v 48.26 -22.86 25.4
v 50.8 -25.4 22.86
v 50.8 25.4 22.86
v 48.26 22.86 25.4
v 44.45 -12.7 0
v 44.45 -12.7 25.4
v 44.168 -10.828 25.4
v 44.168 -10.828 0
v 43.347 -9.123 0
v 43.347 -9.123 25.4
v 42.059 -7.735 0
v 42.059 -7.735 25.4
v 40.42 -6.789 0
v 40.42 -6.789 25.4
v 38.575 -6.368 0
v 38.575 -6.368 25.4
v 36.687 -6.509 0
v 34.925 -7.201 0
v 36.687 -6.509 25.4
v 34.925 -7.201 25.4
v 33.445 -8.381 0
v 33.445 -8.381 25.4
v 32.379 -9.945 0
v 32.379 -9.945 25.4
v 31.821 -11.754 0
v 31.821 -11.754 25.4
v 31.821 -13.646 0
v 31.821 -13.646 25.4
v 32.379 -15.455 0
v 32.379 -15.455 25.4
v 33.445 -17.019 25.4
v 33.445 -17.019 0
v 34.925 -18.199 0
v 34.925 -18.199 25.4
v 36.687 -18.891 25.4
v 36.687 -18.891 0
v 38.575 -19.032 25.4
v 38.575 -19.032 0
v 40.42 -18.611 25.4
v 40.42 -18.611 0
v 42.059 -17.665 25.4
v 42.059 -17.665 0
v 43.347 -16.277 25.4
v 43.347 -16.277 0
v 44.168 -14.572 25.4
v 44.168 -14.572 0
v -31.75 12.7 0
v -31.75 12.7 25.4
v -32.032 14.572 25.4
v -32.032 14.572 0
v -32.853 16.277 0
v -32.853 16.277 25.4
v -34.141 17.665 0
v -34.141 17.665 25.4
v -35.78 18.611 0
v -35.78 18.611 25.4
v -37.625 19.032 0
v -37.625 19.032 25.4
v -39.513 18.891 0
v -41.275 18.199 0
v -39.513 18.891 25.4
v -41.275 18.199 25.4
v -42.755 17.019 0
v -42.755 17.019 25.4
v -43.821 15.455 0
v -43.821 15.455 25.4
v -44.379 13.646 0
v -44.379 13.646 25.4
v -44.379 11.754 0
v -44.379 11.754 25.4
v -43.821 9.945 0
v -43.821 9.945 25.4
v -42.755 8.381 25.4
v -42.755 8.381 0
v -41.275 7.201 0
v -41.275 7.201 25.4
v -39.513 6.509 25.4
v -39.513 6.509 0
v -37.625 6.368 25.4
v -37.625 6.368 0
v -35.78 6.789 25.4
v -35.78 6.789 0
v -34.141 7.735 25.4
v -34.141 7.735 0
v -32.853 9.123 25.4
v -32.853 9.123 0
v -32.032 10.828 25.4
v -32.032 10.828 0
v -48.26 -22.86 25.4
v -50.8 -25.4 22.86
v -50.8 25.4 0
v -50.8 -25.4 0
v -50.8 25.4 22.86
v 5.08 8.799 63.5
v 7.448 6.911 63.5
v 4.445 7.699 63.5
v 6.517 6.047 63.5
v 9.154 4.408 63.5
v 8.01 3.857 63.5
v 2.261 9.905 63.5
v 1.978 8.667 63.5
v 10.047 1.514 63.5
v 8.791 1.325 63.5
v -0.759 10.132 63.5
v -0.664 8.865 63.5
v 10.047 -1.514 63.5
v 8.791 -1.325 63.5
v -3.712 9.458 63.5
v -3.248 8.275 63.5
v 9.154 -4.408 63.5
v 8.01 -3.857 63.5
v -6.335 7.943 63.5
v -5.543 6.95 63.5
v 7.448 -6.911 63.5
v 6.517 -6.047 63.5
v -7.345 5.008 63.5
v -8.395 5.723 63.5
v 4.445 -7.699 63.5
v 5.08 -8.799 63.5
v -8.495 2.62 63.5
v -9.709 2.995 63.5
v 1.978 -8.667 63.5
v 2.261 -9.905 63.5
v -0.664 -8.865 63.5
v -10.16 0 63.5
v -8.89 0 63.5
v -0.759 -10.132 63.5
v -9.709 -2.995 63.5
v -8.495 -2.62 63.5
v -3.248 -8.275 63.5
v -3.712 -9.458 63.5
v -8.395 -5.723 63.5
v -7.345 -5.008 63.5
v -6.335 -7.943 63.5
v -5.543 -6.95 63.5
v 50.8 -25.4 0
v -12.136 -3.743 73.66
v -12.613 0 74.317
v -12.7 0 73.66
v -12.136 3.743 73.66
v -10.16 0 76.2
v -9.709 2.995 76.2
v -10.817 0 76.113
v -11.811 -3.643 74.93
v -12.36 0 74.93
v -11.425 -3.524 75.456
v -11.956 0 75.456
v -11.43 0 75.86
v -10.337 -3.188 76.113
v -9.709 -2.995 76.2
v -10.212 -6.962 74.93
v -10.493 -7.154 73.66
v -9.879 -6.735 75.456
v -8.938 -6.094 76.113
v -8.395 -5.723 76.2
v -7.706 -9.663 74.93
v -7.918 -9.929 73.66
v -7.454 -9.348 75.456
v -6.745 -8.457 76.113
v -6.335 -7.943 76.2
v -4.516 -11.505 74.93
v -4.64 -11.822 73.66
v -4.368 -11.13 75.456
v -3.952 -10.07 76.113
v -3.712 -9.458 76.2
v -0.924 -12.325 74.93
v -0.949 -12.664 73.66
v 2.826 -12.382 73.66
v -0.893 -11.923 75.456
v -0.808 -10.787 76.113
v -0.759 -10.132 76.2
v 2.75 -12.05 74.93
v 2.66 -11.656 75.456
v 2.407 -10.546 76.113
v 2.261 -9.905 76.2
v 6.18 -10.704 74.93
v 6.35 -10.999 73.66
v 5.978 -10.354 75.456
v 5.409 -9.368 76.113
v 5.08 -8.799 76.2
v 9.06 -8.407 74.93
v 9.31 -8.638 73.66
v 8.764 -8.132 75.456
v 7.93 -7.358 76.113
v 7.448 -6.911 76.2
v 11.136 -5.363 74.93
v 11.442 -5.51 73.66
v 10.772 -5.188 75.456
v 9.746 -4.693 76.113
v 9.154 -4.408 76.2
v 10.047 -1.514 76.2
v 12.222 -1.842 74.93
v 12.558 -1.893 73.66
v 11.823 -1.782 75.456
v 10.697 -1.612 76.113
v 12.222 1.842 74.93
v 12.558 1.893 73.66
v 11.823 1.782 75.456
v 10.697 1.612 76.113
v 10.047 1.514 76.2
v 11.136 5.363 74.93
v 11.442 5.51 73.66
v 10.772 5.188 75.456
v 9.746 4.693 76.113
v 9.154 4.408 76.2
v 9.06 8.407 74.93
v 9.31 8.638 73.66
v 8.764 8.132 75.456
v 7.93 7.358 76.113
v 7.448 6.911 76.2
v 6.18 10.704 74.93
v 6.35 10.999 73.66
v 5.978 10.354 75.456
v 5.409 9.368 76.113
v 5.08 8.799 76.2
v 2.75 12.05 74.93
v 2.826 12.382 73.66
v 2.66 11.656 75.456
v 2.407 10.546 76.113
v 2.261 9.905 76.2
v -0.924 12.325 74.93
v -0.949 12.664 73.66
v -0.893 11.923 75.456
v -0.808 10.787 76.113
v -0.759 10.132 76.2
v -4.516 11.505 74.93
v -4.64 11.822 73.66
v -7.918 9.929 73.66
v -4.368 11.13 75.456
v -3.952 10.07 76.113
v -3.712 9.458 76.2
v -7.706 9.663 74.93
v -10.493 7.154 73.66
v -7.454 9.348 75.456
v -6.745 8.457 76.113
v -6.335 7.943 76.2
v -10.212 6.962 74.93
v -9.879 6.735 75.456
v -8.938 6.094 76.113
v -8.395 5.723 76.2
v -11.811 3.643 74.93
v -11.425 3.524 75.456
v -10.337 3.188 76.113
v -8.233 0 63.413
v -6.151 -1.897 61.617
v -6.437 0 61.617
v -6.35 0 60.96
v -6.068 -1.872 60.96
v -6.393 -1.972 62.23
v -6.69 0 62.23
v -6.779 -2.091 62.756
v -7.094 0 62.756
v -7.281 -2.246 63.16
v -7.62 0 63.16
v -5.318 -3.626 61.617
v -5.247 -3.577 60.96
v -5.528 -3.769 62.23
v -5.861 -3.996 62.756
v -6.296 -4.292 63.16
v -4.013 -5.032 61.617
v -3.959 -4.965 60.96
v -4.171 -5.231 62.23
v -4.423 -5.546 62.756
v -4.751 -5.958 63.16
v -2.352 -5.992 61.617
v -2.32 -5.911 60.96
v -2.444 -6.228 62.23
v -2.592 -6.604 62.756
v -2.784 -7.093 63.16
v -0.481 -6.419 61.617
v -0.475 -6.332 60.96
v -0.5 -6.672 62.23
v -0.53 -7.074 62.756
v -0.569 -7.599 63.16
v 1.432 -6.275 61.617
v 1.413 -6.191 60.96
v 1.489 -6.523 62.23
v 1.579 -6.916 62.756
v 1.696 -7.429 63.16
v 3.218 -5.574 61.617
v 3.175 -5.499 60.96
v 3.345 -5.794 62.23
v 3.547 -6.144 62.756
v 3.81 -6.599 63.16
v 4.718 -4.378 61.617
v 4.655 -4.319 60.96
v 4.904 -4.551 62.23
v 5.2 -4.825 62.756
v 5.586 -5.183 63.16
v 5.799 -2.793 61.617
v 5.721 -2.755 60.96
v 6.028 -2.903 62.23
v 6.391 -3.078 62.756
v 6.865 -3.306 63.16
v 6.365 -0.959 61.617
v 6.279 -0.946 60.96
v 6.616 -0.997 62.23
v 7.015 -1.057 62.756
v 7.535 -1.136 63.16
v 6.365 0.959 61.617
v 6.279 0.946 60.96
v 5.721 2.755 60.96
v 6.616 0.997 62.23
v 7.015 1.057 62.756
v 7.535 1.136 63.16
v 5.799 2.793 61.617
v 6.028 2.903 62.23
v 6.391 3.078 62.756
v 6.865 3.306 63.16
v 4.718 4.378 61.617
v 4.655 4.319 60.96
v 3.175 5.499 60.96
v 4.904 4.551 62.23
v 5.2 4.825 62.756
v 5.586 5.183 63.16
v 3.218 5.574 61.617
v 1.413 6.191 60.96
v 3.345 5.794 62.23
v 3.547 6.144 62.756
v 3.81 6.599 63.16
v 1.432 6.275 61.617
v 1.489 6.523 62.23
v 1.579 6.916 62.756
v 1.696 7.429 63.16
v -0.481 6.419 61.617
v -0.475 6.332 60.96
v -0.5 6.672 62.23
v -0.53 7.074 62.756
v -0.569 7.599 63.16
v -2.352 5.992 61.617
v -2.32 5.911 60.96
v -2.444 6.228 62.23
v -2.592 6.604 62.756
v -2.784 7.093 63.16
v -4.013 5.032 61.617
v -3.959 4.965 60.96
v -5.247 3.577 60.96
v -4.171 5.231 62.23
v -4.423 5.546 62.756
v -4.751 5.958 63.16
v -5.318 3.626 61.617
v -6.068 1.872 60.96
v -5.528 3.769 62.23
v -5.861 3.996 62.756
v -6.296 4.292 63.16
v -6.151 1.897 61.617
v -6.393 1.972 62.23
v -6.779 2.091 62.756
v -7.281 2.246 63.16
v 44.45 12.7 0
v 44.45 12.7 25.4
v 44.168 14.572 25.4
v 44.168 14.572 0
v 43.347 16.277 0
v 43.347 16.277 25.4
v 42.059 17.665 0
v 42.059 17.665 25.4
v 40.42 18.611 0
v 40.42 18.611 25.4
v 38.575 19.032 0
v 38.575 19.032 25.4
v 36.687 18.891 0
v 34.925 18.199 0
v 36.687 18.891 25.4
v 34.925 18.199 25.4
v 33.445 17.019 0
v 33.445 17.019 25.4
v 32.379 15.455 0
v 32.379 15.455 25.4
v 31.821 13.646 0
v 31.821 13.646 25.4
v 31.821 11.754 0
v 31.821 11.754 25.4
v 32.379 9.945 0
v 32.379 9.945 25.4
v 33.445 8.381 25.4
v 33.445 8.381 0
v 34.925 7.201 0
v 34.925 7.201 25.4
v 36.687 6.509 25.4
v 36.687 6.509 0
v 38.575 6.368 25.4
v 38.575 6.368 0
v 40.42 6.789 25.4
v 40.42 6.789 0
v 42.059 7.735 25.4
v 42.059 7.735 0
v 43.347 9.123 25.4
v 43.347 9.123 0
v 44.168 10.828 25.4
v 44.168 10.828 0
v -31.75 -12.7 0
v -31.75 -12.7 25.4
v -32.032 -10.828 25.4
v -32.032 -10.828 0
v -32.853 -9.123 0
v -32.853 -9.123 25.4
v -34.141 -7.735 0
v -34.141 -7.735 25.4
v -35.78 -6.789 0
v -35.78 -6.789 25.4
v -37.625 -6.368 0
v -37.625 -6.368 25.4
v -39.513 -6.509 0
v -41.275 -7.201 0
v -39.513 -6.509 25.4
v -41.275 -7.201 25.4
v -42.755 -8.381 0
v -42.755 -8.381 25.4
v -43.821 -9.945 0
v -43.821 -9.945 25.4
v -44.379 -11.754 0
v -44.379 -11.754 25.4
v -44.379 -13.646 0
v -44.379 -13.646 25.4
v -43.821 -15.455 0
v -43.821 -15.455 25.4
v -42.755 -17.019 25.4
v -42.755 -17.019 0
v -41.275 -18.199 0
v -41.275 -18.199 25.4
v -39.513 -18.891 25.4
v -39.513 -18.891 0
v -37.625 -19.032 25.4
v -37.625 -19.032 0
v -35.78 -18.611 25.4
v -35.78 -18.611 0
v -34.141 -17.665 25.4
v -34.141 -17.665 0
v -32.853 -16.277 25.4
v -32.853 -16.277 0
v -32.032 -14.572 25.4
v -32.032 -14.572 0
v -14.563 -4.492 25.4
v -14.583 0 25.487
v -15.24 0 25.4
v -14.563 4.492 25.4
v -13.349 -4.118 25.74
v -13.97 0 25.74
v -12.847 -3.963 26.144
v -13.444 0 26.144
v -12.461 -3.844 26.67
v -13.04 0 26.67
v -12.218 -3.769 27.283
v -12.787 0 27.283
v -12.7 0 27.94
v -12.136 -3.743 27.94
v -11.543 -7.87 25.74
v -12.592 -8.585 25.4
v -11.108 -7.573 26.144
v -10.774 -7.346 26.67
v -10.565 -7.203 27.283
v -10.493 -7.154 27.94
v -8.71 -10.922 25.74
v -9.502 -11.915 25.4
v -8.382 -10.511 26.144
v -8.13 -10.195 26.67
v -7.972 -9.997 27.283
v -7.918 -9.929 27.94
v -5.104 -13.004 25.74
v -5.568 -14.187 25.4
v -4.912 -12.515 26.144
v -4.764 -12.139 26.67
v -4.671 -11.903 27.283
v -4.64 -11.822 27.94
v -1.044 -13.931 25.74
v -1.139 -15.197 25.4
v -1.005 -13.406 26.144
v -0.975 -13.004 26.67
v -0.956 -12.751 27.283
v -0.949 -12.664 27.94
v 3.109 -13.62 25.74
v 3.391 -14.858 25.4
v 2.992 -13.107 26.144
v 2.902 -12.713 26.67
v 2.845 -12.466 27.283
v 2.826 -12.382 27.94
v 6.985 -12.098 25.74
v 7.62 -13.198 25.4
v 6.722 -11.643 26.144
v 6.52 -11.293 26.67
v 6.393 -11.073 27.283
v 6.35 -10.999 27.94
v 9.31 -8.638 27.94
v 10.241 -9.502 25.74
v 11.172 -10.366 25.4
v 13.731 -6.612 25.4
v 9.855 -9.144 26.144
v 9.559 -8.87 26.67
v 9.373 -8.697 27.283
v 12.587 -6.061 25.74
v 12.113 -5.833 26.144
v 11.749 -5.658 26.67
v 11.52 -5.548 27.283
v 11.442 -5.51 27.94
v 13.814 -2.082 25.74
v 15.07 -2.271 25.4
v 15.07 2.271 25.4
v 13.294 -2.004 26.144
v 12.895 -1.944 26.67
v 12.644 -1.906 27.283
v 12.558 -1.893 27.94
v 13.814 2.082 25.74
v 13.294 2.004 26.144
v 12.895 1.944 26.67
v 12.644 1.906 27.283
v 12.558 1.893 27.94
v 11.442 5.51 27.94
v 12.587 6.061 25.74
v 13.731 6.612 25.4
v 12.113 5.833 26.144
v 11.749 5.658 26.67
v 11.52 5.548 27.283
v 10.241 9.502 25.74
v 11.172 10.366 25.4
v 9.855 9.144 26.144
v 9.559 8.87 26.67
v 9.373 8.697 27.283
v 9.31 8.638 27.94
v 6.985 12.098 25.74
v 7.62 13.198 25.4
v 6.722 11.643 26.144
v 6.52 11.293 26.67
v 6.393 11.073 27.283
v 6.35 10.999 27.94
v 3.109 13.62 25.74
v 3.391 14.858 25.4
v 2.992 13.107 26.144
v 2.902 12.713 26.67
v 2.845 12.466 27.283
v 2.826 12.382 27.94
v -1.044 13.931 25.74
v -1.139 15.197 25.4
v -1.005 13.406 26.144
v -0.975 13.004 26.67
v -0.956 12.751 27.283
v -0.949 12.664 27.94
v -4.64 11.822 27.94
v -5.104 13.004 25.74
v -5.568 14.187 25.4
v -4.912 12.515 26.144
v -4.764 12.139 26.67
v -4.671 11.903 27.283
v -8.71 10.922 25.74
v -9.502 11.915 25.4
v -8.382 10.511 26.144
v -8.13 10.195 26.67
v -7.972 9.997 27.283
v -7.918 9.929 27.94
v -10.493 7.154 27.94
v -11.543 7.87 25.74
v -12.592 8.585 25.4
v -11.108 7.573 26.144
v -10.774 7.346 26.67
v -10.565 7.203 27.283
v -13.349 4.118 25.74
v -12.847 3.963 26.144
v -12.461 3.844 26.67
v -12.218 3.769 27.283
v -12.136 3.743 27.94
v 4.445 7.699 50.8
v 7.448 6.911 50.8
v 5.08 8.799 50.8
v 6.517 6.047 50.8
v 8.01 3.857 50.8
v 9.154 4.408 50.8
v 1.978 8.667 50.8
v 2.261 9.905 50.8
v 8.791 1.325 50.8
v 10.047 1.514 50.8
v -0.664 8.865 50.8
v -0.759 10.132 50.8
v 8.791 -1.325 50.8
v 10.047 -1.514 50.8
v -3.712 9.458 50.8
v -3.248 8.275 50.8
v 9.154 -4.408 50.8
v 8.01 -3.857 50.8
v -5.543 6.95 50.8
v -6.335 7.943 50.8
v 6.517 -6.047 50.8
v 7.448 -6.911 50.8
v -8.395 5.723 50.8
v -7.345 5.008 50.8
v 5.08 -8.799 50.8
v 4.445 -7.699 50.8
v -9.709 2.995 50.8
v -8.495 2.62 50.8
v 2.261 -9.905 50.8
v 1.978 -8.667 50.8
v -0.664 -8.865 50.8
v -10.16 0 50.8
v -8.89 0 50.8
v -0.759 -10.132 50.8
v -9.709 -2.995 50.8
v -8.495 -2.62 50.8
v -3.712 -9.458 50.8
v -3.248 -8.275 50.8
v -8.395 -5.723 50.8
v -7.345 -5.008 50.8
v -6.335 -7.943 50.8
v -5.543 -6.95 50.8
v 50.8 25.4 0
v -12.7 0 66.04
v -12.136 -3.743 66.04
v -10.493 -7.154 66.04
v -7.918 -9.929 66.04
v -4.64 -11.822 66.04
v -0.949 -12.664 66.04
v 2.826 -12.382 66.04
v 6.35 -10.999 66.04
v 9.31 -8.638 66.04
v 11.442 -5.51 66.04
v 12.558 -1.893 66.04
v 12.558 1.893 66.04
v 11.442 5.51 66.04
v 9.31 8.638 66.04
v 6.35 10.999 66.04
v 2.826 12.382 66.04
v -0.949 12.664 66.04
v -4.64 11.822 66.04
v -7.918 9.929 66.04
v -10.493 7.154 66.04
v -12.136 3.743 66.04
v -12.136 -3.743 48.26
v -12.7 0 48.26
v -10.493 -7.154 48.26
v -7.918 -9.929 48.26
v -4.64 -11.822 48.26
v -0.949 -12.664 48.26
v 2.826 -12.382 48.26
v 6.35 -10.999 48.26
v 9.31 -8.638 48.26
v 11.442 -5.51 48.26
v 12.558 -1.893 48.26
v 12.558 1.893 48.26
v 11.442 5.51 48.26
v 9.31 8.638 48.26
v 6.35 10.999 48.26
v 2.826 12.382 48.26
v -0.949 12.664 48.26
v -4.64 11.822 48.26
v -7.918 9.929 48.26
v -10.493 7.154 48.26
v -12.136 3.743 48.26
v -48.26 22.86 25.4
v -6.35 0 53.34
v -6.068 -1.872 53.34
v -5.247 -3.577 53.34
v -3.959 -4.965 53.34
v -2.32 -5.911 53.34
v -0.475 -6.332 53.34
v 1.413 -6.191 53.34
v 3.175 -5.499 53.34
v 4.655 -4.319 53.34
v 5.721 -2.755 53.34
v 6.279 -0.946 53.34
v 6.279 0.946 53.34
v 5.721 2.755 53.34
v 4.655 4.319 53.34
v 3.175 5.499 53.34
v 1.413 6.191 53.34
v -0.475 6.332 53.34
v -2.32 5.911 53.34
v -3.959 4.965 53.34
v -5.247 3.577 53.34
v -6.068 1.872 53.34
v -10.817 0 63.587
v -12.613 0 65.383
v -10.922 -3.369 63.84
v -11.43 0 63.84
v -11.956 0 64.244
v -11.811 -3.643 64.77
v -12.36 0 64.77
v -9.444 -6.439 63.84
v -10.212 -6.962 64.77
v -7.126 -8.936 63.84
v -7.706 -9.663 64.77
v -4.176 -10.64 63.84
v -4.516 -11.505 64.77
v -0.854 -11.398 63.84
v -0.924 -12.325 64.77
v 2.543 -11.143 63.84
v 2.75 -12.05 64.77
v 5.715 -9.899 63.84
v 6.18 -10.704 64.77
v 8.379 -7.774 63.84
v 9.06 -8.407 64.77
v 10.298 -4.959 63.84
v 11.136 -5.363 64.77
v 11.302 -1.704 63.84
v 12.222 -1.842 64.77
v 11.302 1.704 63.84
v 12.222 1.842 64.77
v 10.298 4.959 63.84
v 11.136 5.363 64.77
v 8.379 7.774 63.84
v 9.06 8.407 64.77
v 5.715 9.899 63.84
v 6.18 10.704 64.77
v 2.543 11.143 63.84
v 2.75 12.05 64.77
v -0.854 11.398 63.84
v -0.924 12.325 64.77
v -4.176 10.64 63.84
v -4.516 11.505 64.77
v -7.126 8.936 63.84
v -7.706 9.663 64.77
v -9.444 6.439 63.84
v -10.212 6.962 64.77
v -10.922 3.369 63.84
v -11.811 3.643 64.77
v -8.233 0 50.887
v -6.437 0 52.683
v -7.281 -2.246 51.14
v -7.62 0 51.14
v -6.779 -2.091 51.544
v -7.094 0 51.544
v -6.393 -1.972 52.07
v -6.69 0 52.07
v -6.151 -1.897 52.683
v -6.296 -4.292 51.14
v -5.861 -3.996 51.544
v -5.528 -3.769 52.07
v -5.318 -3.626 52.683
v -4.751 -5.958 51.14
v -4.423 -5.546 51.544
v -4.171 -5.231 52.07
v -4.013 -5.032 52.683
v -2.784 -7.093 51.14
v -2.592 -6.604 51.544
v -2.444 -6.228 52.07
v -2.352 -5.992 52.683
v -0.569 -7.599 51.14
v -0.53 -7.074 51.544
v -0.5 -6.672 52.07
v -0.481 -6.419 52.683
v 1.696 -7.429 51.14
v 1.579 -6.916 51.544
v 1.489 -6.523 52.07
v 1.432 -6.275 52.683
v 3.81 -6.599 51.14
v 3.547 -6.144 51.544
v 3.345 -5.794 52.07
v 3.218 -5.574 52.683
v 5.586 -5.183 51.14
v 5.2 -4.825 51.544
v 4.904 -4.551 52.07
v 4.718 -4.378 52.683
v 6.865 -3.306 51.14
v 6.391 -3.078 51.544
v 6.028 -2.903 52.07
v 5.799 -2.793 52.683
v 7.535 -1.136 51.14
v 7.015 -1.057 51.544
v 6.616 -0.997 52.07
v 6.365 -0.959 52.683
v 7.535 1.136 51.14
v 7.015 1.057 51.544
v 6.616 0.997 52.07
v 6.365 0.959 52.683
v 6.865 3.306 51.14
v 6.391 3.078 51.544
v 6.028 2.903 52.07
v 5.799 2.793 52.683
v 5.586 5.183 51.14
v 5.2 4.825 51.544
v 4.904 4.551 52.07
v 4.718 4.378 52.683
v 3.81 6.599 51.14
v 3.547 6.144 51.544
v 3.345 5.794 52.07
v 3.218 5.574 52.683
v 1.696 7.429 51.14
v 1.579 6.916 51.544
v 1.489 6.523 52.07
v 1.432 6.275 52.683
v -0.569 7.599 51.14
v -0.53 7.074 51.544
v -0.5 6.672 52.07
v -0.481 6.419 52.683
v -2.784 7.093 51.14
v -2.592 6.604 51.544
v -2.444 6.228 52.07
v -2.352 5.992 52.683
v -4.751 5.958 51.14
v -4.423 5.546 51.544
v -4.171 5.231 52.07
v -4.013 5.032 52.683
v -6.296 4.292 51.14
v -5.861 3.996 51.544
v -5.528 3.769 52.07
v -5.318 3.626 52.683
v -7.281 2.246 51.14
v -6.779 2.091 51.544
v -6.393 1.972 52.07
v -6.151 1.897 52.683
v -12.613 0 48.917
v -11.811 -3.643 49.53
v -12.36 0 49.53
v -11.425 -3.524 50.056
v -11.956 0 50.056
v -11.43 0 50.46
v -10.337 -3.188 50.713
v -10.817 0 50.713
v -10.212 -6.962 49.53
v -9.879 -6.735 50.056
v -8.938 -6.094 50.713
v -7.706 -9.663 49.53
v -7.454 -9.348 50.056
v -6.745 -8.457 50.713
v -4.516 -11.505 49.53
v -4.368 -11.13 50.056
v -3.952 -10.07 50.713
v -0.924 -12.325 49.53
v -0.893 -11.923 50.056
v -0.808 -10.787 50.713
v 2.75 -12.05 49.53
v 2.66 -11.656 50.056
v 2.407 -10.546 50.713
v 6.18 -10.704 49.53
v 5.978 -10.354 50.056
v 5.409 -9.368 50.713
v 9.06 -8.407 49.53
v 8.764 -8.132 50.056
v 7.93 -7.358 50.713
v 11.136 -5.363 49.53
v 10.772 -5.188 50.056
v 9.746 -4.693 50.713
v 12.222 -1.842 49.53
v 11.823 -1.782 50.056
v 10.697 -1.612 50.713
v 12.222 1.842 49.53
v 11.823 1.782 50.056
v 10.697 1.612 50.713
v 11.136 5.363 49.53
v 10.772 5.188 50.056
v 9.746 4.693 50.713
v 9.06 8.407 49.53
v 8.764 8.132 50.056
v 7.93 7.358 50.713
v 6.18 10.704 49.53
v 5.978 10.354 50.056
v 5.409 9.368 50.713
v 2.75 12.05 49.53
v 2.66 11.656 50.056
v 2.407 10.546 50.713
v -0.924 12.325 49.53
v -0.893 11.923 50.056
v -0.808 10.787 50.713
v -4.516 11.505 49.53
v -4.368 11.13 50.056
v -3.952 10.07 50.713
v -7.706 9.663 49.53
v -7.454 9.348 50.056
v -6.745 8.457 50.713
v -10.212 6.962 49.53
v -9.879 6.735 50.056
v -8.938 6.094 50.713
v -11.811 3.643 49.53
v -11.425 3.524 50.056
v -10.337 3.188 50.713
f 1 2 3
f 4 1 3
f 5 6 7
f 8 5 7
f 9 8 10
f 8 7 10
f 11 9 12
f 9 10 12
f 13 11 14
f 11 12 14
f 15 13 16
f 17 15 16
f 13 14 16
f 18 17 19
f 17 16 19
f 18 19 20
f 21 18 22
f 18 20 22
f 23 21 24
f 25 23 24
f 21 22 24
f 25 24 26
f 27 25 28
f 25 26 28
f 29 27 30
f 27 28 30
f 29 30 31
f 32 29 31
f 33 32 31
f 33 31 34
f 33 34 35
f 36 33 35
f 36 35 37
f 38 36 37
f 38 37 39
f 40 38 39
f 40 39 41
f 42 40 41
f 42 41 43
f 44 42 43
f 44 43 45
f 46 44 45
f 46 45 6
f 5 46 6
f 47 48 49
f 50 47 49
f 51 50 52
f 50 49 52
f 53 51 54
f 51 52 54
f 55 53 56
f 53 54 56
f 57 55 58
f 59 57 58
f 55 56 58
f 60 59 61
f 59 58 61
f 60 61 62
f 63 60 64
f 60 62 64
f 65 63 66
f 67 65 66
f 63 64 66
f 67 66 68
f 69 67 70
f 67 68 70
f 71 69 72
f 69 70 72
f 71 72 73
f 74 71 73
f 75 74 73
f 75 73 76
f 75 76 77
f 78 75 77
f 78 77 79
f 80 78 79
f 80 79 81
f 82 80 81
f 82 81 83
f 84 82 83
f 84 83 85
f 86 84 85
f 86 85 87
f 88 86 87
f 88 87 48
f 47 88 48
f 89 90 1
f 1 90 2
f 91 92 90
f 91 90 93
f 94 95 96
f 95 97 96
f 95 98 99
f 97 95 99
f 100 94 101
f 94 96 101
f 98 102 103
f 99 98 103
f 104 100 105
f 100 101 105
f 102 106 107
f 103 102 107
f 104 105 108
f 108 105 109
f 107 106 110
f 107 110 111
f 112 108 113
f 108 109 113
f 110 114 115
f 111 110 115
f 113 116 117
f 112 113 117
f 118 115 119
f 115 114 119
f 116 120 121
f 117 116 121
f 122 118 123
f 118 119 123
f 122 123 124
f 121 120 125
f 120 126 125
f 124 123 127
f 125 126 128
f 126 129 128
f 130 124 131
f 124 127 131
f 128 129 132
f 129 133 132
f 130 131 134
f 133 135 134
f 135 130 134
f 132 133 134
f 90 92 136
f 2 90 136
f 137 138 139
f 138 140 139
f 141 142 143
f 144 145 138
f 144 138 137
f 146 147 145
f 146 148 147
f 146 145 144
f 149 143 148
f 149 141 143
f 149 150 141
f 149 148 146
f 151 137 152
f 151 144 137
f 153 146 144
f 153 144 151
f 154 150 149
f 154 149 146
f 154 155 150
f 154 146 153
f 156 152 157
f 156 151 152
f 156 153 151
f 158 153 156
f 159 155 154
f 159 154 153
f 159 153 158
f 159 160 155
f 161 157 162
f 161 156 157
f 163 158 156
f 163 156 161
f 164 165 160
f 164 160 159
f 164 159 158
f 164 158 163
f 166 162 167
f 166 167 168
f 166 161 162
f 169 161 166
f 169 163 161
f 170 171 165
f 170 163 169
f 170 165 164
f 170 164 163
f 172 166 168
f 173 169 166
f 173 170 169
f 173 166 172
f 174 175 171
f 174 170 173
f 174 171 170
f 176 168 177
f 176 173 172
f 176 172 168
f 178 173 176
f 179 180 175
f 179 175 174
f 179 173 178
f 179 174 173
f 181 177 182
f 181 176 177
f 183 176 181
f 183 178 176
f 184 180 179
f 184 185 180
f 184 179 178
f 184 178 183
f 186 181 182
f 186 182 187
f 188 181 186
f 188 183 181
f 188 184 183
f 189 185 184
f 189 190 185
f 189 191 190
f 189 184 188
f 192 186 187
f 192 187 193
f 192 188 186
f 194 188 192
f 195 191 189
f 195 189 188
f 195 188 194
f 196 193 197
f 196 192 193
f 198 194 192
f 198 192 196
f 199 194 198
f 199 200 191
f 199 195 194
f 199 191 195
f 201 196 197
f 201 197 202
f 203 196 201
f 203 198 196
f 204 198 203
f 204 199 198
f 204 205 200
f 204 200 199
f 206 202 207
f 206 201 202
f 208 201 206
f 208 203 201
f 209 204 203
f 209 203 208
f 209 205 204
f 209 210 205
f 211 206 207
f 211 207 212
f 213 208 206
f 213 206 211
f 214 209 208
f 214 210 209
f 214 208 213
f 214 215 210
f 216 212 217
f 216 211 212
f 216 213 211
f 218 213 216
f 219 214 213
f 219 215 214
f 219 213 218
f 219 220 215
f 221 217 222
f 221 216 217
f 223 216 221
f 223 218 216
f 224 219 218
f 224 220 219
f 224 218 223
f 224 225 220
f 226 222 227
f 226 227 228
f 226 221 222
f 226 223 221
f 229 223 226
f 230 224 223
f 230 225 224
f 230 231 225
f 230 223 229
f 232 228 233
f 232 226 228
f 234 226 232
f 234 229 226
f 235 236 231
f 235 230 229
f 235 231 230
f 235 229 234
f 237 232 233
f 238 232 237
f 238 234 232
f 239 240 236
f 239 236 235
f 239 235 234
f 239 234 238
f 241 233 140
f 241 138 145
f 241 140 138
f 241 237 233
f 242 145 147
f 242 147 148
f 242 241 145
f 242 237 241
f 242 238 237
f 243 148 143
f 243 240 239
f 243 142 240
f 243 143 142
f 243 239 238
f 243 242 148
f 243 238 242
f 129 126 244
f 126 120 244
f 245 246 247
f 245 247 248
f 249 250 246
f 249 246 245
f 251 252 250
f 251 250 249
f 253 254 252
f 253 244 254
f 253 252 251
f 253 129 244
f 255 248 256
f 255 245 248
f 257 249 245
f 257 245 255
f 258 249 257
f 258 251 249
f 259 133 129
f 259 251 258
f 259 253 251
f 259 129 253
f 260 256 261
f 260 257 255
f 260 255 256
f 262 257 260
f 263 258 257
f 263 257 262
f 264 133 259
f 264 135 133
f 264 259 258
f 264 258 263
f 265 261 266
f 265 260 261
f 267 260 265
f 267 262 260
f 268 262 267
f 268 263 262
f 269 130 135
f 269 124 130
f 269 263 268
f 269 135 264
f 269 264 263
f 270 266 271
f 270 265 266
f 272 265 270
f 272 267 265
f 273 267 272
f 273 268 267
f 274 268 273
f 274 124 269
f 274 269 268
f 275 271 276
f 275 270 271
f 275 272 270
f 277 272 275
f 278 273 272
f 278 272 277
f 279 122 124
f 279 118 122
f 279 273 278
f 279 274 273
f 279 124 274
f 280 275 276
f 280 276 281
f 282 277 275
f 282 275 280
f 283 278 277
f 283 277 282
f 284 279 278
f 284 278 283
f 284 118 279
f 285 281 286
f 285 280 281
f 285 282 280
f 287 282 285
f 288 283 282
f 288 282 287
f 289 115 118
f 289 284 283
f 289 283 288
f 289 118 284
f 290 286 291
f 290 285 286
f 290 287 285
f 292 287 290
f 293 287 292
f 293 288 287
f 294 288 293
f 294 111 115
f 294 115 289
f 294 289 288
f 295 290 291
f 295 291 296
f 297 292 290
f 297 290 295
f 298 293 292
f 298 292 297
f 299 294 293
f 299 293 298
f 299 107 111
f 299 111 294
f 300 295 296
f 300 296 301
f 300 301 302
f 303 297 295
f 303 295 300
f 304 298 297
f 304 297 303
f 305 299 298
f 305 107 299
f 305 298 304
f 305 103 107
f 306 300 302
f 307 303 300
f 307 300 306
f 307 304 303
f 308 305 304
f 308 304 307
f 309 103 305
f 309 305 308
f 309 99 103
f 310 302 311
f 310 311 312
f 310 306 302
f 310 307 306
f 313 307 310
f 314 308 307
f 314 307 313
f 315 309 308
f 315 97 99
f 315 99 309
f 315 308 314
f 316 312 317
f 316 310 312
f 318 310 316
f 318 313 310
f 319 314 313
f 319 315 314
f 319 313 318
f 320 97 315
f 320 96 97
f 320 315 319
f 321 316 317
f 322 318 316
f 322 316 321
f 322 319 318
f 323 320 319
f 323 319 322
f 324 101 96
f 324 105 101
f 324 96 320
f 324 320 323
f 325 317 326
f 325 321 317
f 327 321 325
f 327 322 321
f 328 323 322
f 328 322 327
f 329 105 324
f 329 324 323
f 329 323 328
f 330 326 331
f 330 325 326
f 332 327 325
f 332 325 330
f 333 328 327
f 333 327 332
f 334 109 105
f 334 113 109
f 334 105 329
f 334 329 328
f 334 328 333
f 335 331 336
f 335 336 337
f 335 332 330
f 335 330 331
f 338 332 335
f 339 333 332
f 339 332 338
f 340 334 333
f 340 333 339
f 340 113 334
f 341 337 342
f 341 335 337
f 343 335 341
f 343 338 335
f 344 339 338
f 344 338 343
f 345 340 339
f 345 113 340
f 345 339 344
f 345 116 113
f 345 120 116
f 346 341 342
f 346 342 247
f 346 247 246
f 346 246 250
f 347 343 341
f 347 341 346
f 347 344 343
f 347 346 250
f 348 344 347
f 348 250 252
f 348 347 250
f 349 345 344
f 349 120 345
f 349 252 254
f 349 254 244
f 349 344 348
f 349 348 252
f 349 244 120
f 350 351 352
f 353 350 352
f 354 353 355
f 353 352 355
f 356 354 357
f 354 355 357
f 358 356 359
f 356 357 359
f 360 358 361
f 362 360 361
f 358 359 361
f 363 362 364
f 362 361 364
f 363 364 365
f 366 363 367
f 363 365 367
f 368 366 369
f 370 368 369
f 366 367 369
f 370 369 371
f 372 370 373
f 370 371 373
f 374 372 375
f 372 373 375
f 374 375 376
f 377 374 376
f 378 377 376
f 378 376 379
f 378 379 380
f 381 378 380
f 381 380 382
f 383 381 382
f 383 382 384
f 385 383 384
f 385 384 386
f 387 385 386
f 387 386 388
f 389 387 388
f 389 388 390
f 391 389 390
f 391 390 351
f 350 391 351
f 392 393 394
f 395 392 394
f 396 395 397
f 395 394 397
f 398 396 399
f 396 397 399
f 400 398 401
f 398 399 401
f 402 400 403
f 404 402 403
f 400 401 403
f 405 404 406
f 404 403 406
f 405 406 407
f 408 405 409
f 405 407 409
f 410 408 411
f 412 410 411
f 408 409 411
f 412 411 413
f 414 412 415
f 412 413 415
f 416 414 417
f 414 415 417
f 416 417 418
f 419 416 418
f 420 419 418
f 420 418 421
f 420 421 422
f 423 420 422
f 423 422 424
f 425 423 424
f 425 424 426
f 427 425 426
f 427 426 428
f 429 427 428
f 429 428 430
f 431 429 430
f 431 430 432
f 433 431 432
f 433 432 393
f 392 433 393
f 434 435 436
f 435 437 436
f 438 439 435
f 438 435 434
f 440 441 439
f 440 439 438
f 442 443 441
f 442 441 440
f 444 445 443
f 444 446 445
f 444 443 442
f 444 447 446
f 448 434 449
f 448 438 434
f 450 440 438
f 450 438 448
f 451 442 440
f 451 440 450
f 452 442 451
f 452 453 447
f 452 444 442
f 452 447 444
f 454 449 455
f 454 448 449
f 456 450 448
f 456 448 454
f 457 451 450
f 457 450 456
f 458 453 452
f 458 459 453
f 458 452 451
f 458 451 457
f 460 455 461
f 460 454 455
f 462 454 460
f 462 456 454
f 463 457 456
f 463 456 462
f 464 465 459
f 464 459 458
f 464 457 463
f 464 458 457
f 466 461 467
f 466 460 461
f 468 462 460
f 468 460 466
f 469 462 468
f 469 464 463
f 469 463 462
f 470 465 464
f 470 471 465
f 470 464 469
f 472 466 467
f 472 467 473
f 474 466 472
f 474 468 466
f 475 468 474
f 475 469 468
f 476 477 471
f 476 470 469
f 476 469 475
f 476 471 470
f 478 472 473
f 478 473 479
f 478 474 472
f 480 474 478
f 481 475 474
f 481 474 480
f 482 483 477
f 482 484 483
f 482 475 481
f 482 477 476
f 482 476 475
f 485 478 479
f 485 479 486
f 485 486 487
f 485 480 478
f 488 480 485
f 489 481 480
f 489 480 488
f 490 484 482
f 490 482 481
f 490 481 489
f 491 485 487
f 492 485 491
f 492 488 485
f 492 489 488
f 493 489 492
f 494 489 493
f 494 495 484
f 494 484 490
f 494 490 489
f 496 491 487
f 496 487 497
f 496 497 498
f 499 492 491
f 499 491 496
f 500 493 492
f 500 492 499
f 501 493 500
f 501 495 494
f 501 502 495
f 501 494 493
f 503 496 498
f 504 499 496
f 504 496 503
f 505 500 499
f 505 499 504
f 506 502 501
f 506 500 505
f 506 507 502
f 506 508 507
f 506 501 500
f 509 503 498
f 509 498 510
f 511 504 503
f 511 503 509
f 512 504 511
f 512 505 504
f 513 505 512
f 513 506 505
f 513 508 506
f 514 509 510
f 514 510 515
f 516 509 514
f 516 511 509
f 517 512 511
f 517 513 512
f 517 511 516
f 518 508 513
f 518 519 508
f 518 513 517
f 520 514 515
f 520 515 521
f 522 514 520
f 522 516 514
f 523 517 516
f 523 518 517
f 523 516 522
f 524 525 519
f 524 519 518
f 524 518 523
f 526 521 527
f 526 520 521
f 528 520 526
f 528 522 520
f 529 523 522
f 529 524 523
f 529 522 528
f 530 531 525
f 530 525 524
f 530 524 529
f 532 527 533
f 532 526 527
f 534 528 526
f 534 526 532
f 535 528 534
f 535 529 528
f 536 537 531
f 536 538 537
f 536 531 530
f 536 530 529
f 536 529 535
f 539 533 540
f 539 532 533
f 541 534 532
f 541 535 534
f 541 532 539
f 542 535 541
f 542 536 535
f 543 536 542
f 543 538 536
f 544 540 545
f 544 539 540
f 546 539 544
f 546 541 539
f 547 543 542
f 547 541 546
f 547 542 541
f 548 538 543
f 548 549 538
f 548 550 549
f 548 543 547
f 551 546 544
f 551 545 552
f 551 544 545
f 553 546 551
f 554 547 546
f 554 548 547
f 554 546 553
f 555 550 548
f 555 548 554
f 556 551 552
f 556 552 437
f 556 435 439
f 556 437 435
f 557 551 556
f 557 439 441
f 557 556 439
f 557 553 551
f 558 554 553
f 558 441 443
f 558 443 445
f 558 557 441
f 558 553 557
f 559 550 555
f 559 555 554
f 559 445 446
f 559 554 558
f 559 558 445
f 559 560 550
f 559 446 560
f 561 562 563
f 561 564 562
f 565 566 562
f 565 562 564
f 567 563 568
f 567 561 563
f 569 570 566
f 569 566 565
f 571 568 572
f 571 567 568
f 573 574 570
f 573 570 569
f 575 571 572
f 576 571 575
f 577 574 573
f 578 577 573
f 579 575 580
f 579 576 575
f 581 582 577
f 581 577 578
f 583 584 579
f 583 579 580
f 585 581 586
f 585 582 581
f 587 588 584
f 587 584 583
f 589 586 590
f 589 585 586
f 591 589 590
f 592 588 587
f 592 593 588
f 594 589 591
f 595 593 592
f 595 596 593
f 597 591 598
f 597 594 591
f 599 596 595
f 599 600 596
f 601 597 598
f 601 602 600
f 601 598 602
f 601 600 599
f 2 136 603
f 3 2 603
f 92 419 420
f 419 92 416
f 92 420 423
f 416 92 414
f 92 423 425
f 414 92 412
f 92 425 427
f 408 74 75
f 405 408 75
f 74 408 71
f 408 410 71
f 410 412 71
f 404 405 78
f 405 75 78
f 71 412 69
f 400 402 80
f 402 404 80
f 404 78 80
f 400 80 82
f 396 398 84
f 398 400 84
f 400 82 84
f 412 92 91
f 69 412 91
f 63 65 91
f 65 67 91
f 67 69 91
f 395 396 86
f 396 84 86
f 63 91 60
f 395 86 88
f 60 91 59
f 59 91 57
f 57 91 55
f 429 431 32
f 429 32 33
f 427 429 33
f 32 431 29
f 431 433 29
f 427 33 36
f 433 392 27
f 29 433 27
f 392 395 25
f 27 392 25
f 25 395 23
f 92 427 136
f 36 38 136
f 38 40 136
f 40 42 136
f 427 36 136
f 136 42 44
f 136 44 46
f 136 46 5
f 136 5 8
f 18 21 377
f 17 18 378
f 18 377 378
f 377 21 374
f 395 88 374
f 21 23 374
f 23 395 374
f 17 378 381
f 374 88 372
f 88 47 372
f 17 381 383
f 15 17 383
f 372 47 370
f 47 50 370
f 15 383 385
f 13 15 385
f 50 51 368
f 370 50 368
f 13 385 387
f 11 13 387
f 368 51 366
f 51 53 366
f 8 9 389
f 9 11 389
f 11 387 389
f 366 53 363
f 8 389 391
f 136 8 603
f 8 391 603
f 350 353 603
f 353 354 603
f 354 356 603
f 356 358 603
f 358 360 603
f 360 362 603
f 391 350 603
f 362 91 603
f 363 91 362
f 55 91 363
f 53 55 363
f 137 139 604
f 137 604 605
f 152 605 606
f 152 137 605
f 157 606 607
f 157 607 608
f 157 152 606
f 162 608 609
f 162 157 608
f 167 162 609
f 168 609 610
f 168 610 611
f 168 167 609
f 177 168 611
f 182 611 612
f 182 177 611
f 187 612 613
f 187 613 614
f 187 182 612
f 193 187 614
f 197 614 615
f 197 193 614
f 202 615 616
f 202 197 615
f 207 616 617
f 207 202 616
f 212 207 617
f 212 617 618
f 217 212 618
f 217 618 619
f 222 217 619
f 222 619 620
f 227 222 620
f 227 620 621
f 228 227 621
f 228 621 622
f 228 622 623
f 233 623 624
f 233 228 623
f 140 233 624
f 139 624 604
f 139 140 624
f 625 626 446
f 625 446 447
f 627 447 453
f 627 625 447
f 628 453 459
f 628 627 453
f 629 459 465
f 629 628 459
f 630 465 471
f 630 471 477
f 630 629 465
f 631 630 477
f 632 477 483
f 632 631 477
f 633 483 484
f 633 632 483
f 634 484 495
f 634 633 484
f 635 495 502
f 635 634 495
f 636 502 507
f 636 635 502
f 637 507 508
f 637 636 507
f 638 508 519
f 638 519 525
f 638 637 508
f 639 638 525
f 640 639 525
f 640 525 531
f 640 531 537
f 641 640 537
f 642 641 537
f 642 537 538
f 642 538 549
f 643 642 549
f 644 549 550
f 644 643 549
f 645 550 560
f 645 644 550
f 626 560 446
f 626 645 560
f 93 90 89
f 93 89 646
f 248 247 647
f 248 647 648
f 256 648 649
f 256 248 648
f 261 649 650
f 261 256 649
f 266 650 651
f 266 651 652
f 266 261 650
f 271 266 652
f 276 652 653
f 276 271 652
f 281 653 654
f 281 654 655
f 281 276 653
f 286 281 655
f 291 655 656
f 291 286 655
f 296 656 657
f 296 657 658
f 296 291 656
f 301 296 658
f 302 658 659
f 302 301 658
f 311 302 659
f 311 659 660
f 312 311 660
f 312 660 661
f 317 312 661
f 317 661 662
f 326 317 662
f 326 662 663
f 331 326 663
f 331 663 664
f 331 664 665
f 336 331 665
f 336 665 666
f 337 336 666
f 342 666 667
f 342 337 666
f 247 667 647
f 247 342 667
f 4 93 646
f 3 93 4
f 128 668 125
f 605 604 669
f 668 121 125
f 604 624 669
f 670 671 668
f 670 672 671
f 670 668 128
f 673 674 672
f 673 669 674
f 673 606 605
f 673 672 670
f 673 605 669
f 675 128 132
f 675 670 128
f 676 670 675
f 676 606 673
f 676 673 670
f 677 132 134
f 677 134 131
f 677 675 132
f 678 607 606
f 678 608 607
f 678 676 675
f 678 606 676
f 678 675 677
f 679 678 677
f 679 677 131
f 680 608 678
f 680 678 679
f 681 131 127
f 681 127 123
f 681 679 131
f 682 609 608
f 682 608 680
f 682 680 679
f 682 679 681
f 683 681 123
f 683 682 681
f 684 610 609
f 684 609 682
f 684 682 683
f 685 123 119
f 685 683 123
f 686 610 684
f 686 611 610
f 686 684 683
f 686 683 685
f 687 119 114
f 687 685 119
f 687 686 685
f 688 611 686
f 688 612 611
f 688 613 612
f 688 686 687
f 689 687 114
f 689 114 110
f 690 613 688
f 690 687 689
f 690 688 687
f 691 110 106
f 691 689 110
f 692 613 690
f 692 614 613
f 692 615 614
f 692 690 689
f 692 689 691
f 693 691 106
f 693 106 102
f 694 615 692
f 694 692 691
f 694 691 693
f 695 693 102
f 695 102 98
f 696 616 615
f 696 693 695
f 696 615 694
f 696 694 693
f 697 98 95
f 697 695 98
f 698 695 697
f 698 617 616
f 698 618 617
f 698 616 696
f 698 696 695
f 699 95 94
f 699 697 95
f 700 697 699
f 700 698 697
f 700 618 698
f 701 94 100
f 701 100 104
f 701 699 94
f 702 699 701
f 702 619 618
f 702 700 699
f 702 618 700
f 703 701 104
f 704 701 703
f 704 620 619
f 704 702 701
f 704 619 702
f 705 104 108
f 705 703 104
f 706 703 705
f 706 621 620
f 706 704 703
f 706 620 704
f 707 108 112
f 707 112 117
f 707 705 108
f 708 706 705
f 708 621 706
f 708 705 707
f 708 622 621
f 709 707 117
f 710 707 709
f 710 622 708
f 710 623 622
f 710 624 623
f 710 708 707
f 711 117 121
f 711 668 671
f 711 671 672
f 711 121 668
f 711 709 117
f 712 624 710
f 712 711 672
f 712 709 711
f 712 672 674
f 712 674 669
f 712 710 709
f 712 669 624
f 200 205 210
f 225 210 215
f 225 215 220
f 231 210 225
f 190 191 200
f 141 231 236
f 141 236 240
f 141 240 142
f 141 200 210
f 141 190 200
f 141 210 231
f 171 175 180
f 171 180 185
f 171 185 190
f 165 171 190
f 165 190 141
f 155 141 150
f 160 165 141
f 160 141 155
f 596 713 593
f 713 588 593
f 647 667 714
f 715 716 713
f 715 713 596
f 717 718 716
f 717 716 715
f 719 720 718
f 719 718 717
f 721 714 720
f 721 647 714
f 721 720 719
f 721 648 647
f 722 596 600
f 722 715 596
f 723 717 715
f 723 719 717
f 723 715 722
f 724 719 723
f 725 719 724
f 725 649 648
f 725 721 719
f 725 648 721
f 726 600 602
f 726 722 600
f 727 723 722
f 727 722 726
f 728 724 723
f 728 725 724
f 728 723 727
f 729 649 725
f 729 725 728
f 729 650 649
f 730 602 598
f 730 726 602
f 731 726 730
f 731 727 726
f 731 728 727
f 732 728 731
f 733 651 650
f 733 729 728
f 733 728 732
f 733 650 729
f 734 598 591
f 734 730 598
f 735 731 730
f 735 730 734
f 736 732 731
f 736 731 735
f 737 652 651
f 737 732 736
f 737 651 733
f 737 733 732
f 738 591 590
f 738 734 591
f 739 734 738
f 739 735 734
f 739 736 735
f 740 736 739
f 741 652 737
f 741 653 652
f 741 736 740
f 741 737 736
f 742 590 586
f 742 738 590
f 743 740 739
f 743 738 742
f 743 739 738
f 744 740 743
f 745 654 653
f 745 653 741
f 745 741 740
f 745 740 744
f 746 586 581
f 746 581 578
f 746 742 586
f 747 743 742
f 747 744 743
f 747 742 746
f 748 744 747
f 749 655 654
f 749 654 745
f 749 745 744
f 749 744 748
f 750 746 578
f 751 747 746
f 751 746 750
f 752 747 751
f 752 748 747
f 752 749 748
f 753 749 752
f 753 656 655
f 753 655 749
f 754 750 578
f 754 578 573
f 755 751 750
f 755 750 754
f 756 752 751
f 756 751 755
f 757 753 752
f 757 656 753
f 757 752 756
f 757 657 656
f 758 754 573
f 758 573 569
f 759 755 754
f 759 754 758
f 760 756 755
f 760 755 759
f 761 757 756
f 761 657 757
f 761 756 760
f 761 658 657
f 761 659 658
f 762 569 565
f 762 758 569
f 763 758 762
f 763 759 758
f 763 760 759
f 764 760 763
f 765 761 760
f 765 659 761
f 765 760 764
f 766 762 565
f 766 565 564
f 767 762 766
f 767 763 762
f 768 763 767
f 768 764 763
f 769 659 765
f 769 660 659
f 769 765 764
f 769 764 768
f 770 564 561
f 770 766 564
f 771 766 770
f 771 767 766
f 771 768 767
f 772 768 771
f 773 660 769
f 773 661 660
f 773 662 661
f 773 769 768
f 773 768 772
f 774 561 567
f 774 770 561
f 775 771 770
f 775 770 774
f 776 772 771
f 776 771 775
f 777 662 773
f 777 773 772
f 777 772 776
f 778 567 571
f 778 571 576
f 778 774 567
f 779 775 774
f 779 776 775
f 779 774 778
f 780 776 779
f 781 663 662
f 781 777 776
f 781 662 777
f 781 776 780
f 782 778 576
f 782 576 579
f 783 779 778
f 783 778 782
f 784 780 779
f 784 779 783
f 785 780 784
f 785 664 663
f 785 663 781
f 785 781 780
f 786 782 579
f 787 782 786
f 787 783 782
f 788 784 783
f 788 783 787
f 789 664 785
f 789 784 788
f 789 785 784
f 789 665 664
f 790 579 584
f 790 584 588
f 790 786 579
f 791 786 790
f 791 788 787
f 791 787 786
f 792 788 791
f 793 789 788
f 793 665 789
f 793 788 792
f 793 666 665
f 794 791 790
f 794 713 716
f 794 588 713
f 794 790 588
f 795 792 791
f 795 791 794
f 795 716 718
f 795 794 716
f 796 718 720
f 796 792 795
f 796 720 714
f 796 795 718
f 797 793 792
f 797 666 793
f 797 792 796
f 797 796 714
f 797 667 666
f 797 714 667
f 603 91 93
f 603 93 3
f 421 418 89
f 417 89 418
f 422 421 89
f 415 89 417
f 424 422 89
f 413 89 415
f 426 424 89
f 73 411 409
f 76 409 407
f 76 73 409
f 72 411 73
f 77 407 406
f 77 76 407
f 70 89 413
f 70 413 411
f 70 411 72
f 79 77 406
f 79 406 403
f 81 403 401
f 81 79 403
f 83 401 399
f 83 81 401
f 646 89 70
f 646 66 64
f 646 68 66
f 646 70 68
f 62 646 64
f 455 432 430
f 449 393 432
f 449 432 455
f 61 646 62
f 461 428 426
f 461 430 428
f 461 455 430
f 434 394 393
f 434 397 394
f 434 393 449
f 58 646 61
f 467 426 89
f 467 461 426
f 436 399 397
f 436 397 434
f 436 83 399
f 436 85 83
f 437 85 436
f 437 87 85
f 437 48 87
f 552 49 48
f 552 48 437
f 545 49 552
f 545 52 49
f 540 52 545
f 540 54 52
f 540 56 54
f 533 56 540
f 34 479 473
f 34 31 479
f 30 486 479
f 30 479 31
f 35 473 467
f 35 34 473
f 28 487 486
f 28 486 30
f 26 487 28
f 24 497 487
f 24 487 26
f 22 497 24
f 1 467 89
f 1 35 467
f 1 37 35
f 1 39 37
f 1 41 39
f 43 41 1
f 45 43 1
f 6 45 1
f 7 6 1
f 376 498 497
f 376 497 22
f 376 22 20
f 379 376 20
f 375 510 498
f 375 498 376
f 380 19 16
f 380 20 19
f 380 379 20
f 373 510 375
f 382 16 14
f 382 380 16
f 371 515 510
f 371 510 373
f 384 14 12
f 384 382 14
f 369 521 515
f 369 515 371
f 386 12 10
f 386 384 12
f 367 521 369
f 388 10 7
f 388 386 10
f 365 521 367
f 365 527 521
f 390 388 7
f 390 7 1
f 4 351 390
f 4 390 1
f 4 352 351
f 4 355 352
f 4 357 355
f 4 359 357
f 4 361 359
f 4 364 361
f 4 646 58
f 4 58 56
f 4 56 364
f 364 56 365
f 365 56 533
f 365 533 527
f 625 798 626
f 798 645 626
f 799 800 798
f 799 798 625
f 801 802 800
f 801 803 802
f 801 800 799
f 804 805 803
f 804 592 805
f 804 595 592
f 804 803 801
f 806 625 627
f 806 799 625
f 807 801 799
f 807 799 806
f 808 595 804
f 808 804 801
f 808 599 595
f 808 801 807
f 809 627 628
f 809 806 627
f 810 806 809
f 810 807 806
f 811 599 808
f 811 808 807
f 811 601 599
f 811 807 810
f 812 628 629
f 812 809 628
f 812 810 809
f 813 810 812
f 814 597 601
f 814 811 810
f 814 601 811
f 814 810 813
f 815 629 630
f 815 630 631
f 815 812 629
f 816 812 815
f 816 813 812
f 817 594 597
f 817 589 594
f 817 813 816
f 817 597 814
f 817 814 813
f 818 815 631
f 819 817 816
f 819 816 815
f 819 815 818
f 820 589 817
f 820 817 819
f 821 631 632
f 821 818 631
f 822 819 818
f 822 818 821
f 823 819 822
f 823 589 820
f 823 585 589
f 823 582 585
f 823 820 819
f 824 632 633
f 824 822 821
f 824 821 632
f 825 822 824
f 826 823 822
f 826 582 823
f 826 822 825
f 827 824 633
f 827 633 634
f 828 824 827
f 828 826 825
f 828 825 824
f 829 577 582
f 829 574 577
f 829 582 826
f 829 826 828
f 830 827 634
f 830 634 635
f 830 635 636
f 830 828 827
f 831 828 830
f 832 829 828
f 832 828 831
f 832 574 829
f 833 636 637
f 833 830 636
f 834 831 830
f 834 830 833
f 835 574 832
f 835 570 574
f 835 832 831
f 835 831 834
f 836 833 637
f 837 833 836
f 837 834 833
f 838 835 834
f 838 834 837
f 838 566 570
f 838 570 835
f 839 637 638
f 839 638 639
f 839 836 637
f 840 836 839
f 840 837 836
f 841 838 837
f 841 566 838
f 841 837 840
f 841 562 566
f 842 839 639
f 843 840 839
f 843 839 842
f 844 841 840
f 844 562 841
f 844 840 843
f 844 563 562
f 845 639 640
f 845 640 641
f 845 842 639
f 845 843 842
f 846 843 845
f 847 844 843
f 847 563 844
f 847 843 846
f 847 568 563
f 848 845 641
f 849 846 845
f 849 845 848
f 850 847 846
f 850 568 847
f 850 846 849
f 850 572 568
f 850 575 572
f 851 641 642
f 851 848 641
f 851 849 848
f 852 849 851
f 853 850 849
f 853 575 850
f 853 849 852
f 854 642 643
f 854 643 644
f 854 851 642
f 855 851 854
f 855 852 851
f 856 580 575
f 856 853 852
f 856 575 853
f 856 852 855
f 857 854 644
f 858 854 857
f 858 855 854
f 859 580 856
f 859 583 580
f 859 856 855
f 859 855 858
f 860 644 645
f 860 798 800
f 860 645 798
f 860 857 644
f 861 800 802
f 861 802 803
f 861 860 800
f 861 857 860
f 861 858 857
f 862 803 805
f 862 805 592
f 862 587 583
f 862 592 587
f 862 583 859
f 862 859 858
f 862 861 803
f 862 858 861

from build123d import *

# Parameters (mm, degrees)
F0_W     = 101.6
F0_H     = 50.8
F1_DEPTH = 25.4
F2_R     = 6.35
F3_DEPTH = 25.401
F4_W     = 12.7
F4_H     = 50.8
F6_W     = 14.0765146797
F6_H     = 12.7
F8_R     = 2.54
F9_SIZE  = 2.54


with BuildPart() as f1:
    # F0 (on Top) → F1 (new body)
    with BuildSketch(Plane.XY):
        Rectangle(F0_W, F0_H)
    extrude(amount=F1_DEPTH)

    # F2 (on face) → F3 (cut, through all)
    with BuildSketch(Plane.XY.offset(25.4)):
        with Locations((-38.1, 12.7)):
            Circle(F2_R)
        with Locations((-38.1, -12.7)):
            Circle(F2_R)
        with Locations((38.1, 12.7)):
            Circle(F2_R)
        with Locations((38.1, -12.7)):
            Circle(F2_R)
    extrude(amount=-F3_DEPTH, mode=Mode.SUBTRACT)

    # F4 (on Front) → F5 (revolve)
    with BuildSketch(Plane.XZ):
        with Locations((-6.35, 50.8)):
            Rectangle(F4_W, F4_H)
    revolve(axis=Axis((0, 0, 50.8), (0, 0, 1)))

    # F6 (on Front) → F7 (revolve, cut)
    with BuildSketch(Plane.XZ):
        with Locations((-13.3882573399, 57.15)):
            Rectangle(F6_W, F6_H)
    revolve(axis=Axis((0, 0, 39.0692129731), (0, 0, 1)), mode=Mode.SUBTRACT)

    # F8
    f8_edges = [f1.edges().sort_by_distance(p)[0] for p in [
        (12.7, 0, 50.8),
        (6.35, 0, 50.8),
        (12.7, 0, 76.2),
        (12.7, 0, 63.5),
        (6.35, 0, 63.5),
        (12.7, 0, 25.4),
    ]]
    fillet(f8_edges, radius=F8_R)

    # F9
    f9_edges = [f1.edges().sort_by_distance(p)[0] for p in [
        (0, -25.4, 25.4),
        (-50.8, 0, 25.4),
        (0, 25.4, 25.4),
        (50.8, 0, 25.4),
    ]]
    chamfer(f9_edges, length=F9_SIZE)


solid = f1.part
